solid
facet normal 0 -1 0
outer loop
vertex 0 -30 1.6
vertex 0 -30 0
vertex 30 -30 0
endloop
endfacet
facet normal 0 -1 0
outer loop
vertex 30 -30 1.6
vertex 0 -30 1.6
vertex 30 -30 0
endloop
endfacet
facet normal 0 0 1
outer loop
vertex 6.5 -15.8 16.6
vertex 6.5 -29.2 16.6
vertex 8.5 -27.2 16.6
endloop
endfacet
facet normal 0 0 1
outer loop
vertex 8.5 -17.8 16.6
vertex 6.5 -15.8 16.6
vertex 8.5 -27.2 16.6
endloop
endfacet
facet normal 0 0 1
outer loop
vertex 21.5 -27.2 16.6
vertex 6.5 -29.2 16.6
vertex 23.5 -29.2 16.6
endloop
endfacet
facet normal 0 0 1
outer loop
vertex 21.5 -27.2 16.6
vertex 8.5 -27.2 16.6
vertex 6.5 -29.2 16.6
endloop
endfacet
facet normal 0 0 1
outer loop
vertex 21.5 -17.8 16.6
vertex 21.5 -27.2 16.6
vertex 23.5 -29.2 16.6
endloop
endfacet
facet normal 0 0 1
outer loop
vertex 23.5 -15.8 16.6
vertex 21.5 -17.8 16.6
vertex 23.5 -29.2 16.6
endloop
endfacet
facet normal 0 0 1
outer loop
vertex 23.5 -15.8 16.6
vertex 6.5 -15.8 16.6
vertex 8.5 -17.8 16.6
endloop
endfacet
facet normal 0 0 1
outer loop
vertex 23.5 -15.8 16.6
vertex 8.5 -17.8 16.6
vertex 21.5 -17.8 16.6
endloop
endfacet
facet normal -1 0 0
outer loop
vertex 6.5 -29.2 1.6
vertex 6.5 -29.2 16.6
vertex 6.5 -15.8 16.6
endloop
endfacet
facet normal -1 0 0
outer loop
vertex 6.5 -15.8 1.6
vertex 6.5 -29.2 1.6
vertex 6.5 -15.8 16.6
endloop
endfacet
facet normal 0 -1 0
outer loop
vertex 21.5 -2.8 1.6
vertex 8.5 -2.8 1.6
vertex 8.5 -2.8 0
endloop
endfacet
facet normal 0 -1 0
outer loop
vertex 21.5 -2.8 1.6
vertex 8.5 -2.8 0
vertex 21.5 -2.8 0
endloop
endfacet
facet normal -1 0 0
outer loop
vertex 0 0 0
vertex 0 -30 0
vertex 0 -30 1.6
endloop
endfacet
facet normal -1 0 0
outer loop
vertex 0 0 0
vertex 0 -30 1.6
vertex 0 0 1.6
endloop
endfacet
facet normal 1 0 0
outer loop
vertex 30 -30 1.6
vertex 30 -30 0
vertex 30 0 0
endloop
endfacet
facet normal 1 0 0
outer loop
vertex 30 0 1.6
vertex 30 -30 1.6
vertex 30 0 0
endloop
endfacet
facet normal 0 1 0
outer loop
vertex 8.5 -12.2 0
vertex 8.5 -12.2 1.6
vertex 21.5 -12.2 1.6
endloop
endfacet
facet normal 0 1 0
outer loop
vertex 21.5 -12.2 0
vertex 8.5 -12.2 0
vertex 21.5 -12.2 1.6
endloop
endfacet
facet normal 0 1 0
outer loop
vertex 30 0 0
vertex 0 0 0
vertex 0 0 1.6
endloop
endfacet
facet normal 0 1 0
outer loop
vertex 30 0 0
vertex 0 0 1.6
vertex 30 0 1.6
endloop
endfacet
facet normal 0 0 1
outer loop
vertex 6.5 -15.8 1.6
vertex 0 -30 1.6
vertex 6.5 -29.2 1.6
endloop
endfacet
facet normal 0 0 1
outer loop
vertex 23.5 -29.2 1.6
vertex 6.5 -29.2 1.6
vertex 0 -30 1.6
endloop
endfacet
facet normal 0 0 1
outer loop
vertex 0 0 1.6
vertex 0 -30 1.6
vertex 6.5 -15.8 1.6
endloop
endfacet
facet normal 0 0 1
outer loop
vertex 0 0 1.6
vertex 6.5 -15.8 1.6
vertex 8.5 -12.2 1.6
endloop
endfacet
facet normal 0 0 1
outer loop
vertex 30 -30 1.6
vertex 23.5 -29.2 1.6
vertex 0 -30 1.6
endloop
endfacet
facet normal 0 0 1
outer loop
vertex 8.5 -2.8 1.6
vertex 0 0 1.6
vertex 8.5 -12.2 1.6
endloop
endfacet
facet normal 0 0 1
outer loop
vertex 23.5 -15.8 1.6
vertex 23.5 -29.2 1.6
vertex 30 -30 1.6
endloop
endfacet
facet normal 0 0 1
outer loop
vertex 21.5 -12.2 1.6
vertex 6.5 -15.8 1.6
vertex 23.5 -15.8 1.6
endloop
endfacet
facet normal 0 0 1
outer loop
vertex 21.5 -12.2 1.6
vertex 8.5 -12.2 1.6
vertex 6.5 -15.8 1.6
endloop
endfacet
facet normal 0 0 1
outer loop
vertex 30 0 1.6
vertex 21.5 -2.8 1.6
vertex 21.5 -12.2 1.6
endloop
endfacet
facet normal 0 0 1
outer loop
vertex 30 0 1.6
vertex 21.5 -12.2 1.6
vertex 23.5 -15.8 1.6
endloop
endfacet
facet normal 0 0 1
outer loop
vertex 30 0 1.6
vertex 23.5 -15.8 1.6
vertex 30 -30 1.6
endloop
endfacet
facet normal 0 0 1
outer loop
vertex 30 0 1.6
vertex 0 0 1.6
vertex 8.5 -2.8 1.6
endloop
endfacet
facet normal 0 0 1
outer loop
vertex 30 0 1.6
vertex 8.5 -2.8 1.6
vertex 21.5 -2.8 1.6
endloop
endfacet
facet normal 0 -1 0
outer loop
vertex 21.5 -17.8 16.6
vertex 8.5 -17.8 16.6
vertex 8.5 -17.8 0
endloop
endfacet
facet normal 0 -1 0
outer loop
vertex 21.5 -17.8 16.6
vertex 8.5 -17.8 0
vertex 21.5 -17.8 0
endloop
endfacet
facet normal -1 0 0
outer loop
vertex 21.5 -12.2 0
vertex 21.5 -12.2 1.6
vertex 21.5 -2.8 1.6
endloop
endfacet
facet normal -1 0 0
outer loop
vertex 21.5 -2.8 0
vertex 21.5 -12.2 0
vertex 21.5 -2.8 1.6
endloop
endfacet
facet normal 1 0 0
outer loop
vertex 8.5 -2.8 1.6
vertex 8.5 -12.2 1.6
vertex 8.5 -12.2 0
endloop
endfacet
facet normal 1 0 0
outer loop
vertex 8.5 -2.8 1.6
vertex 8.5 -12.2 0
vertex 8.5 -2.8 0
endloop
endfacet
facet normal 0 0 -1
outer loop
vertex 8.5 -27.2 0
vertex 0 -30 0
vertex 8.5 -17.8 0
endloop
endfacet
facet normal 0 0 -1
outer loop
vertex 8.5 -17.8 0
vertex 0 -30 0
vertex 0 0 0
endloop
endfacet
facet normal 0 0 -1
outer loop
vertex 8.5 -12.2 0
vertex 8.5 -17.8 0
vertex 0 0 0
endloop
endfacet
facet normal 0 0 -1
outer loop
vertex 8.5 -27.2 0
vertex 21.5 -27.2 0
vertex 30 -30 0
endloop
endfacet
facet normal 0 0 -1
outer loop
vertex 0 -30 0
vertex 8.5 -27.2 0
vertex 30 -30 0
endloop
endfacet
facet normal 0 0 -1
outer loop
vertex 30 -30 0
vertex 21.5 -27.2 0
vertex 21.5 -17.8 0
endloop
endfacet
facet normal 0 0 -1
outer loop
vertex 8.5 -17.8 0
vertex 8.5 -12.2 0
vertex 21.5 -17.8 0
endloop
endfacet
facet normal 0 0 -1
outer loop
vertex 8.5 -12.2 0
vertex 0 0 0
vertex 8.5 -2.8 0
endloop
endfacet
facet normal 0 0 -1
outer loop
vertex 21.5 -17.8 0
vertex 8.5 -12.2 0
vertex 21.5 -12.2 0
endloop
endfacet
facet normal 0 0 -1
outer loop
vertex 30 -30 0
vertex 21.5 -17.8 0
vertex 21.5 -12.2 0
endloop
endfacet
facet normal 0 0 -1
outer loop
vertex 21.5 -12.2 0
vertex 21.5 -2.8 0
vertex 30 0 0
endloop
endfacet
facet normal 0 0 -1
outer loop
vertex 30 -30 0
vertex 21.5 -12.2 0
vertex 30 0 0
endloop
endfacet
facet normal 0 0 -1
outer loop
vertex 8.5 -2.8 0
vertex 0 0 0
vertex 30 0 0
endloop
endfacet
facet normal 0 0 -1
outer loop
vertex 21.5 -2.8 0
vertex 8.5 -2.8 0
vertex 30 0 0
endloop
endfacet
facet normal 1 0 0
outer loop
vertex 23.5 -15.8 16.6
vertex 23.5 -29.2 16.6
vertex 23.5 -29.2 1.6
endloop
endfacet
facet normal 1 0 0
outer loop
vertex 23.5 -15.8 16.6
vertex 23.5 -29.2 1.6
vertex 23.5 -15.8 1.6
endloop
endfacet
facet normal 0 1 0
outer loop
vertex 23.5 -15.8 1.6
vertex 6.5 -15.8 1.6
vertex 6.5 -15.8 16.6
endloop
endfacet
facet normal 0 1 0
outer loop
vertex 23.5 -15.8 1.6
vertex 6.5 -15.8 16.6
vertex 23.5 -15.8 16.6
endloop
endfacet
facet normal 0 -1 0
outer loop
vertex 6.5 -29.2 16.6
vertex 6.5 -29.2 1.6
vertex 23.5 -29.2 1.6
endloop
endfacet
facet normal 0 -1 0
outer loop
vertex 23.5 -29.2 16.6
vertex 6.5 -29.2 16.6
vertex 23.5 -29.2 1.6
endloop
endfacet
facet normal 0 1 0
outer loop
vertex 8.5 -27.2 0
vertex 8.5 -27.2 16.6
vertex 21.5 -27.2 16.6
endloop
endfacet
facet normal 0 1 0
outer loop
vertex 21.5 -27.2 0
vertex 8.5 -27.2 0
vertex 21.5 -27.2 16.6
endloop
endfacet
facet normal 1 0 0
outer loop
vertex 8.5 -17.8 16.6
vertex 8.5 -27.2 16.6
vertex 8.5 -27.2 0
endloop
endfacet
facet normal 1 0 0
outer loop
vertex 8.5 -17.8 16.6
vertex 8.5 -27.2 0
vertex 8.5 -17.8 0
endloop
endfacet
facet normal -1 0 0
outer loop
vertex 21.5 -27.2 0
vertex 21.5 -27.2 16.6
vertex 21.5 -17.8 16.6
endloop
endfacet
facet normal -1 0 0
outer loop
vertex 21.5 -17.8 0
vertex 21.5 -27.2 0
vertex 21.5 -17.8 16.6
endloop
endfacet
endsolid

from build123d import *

# Parameters (mm, degrees)
F0_W     = 30
F0_H     = 30
F1_DEPTH = 1.6
F2_W     = 13
F2_H     = 9.4
F3_DEPTH = 25
F2_W_2   = 17
F2_H_2   = 13.4
F4_DEPTH = 15
F5_DEPTH = 25


with BuildPart() as f1:
    # F0 (on Top) → F1 (new body)
    with BuildSketch(Plane.XY):
        with Locations((15, -15)):
            Rectangle(F0_W, F0_H)
    extrude(amount=F1_DEPTH)

    # F2 (on face) → F3 (cut)
    with BuildSketch(Plane.XY.offset(1.6)):
        with Locations((15, -7.5)):
            Rectangle(F2_W, F2_H)
    extrude(amount=-F3_DEPTH, mode=Mode.SUBTRACT)

    # F2 (on face) → F4 (join)
    with BuildSketch(Plane.XY.offset(1.6)):
        with Locations((15, -22.5)):
            Rectangle(F2_W_2, F2_H_2)
        with Locations((15, -22.5)):
            Rectangle(F2_W, F2_H, mode=Mode.SUBTRACT)
    extrude(amount=F4_DEPTH)

    # F2 (on face) → F5 (cut)
    with BuildSketch(Plane.XY.offset(1.6)):
        with Locations((15, -22.5)):
            Rectangle(F2_W, F2_H)
    extrude(amount=-F5_DEPTH, mode=Mode.SUBTRACT)


solid = f1.part
